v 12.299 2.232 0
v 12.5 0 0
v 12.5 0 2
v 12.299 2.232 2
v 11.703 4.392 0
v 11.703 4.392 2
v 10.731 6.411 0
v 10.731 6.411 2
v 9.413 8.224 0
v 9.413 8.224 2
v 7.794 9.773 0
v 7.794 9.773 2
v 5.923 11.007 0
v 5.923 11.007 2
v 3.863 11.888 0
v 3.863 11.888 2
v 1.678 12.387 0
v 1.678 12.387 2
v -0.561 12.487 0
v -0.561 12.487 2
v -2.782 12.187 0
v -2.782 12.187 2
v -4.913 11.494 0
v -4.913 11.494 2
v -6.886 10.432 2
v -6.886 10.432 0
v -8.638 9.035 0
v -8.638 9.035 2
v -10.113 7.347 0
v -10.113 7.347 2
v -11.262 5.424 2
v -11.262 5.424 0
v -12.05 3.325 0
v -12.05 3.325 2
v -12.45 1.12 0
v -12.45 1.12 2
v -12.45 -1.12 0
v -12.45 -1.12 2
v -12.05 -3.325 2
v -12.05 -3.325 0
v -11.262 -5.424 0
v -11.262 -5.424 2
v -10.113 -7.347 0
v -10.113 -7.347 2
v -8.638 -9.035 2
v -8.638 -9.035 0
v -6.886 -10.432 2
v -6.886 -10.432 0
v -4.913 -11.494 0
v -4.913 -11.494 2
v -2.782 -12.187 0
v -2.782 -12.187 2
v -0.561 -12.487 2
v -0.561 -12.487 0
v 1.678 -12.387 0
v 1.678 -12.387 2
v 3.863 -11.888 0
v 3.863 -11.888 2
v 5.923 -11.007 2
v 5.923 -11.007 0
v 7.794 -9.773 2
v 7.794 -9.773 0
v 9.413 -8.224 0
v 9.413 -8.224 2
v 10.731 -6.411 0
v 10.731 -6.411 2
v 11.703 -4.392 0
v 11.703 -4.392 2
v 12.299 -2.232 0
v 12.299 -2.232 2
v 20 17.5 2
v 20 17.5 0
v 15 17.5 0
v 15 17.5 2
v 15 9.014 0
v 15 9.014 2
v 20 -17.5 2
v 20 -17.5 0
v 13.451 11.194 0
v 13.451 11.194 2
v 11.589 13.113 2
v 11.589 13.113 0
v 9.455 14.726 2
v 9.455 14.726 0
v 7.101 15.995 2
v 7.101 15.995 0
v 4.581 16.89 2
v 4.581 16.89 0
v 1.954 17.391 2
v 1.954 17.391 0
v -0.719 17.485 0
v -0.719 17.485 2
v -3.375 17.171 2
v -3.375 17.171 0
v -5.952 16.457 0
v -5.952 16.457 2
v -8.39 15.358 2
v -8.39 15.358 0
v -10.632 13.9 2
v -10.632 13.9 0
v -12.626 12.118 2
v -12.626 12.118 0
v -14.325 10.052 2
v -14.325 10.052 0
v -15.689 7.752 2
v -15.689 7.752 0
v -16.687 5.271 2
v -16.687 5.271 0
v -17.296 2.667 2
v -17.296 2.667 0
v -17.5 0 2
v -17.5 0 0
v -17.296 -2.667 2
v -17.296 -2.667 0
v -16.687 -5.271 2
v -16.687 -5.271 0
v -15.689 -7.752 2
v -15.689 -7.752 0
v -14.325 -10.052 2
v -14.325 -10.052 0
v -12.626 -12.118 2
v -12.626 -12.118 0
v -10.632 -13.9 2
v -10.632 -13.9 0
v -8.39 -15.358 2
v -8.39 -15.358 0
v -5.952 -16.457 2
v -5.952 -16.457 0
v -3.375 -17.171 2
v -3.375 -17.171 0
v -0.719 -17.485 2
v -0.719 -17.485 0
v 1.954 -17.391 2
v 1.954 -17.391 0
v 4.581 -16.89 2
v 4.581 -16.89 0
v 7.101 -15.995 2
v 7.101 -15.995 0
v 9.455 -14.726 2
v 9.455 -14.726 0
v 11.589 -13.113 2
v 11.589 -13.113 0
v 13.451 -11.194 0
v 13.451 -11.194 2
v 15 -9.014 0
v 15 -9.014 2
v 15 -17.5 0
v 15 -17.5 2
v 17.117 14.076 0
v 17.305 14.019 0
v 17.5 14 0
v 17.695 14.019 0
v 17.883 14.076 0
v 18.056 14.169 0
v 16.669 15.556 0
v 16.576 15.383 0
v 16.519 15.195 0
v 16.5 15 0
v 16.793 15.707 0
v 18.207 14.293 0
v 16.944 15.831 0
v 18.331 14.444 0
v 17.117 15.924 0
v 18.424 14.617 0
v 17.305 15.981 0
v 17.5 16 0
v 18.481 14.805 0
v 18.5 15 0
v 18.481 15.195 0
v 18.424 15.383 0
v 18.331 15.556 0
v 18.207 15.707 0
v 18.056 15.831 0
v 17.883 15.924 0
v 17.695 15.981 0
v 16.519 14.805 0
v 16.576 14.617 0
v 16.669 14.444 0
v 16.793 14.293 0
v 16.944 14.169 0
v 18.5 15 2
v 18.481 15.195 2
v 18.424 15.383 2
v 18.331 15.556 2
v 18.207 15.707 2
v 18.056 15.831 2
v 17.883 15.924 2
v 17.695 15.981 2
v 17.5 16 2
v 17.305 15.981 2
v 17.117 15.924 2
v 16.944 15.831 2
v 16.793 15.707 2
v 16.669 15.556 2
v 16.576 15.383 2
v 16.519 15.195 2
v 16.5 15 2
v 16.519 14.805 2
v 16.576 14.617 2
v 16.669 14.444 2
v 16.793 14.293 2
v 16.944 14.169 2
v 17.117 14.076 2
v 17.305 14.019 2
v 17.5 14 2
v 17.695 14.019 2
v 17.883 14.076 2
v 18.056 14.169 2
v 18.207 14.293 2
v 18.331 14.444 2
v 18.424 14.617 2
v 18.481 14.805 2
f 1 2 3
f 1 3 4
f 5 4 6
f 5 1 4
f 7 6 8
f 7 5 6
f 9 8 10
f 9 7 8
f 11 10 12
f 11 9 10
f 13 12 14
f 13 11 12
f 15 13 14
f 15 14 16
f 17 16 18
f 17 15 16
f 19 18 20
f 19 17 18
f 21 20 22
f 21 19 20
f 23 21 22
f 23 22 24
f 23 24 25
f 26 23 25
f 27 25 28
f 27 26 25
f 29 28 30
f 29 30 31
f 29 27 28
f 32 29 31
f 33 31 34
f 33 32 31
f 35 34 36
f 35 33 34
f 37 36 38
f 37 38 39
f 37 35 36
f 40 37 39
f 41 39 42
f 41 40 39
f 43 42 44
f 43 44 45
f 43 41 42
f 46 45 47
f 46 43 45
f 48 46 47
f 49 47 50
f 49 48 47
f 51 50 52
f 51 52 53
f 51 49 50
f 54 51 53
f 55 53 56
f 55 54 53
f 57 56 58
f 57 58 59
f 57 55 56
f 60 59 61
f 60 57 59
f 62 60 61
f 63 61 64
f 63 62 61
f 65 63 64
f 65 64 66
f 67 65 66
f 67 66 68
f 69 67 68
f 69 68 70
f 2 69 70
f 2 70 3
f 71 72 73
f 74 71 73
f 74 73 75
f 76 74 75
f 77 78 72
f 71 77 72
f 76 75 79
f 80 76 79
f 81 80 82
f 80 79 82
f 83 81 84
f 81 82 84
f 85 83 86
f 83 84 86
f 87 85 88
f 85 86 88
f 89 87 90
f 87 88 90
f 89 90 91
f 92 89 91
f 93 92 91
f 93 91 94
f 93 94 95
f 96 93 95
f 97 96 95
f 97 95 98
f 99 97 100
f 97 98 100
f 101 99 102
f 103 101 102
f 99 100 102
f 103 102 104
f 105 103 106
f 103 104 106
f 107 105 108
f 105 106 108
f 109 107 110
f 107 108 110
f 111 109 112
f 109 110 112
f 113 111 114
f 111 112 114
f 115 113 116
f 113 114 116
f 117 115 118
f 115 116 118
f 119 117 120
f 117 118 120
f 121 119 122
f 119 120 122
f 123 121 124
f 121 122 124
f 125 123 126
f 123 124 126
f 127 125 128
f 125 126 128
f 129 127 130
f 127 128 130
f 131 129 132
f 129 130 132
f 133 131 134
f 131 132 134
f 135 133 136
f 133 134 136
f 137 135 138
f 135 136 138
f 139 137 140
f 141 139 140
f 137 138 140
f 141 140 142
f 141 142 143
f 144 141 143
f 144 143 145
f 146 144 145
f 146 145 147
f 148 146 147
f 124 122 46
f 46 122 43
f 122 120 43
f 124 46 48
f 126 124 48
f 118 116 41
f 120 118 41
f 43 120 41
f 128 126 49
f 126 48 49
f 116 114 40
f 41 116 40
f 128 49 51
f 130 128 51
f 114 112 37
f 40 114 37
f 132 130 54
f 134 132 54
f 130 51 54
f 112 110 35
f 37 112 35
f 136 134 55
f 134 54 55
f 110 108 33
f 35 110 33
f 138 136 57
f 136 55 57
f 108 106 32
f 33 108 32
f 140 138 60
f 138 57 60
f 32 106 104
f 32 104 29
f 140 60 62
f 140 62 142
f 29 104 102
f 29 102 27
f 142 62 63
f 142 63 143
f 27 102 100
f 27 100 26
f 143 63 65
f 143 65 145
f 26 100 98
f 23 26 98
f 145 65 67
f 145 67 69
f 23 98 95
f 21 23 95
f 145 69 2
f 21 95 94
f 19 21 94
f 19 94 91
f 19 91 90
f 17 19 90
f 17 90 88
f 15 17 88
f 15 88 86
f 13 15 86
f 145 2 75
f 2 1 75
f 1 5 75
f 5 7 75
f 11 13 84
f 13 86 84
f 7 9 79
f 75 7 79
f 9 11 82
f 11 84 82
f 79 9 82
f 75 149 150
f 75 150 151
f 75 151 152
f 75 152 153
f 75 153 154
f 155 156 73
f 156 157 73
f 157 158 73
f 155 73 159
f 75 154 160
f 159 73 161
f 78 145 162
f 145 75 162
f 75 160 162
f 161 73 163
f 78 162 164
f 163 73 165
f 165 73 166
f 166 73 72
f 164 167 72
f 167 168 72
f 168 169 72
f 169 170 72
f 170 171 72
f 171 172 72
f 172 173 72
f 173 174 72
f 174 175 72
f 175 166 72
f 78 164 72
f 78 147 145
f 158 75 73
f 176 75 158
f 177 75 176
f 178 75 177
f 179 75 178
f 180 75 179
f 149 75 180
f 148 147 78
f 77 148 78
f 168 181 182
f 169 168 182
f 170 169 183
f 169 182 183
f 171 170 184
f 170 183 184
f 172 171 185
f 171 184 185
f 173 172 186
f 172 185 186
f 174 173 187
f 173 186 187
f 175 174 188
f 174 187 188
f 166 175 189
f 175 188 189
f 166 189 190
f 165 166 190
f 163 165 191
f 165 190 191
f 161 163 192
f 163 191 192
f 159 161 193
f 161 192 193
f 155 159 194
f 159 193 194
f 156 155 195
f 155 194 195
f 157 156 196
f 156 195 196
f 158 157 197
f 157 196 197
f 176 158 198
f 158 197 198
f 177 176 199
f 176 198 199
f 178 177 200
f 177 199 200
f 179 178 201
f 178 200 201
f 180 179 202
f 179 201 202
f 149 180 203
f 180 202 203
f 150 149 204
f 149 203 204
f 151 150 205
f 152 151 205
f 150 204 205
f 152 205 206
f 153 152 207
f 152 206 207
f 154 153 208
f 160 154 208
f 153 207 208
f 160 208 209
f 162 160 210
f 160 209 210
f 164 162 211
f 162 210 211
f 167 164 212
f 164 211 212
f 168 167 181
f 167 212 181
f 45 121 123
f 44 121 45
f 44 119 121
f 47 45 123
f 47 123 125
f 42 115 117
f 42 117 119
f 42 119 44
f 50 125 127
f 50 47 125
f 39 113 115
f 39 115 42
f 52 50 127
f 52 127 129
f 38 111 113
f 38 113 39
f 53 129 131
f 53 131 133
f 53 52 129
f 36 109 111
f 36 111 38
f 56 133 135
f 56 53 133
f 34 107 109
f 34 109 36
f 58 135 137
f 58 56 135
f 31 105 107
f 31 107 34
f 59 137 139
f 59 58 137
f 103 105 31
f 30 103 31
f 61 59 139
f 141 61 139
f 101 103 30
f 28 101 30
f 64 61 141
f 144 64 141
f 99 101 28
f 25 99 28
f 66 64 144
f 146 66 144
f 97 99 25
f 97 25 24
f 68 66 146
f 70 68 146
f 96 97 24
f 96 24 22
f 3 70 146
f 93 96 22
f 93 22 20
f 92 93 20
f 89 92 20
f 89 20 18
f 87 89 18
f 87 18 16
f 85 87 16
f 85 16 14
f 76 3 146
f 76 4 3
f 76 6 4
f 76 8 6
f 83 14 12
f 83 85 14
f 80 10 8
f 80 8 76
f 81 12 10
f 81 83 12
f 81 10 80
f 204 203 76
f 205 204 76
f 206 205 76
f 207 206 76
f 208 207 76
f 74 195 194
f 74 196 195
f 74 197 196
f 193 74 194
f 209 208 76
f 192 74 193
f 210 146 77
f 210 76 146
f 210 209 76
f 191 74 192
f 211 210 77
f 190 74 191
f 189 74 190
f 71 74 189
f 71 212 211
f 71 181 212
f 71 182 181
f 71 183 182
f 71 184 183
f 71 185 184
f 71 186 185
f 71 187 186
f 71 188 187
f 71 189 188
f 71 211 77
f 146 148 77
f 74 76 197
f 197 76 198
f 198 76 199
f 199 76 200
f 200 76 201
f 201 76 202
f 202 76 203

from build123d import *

# Parameters (mm, degrees)
F0_R     = 12.5
F1_DEPTH = 2
F2_R     = 1
F3_DEPTH = 2


with BuildPart() as f1:
    # F0 (on Top) → F1 (new body)
    with BuildSketch(Plane.XY):
        with BuildLine():
            Line((15, -9.0138781887), (15, 9.0138781887))
            ThreePointArc((15, 9.0138781887), (-17.5, 0), (15, -9.0138781887))
        make_face()
        Circle(F0_R, mode=Mode.SUBTRACT)
        with BuildLine():
            ThreePointArc((15, -9.0138781887), (16.863421954, -4.6770717335), (17.5, 0))
            ThreePointArc((17.5, 0), (16.863421954, 4.6770717335), (15, 9.0138781887))
            Line((15, 9.0138781887), (15, -9.0138781887))
        make_face()
        with BuildLine():
            ThreePointArc((15, 9.0138781887), (16.863421954, 4.6770717335), (17.5, 0))
            ThreePointArc((17.5, 0), (16.863421954, -4.6770717335), (15, -9.0138781887))
            Line((15, -9.0138781887), (15, -17.5))
            Line((15, -17.5), (20, -17.5))
            Line((20, -17.5), (20, 17.5))
            Line((20, 17.5), (15, 17.5))
            Line((15, 17.5), (15, 9.0138781887))
        make_face()
    extrude(amount=F1_DEPTH)

    # F2 (on face) → F3 (cut)
    with BuildSketch(Plane.XY.offset(2)):
        with Locations((17.5, 15)):
            Circle(F2_R)
    extrude(amount=-F3_DEPTH, mode=Mode.SUBTRACT)


solid = f1.part
